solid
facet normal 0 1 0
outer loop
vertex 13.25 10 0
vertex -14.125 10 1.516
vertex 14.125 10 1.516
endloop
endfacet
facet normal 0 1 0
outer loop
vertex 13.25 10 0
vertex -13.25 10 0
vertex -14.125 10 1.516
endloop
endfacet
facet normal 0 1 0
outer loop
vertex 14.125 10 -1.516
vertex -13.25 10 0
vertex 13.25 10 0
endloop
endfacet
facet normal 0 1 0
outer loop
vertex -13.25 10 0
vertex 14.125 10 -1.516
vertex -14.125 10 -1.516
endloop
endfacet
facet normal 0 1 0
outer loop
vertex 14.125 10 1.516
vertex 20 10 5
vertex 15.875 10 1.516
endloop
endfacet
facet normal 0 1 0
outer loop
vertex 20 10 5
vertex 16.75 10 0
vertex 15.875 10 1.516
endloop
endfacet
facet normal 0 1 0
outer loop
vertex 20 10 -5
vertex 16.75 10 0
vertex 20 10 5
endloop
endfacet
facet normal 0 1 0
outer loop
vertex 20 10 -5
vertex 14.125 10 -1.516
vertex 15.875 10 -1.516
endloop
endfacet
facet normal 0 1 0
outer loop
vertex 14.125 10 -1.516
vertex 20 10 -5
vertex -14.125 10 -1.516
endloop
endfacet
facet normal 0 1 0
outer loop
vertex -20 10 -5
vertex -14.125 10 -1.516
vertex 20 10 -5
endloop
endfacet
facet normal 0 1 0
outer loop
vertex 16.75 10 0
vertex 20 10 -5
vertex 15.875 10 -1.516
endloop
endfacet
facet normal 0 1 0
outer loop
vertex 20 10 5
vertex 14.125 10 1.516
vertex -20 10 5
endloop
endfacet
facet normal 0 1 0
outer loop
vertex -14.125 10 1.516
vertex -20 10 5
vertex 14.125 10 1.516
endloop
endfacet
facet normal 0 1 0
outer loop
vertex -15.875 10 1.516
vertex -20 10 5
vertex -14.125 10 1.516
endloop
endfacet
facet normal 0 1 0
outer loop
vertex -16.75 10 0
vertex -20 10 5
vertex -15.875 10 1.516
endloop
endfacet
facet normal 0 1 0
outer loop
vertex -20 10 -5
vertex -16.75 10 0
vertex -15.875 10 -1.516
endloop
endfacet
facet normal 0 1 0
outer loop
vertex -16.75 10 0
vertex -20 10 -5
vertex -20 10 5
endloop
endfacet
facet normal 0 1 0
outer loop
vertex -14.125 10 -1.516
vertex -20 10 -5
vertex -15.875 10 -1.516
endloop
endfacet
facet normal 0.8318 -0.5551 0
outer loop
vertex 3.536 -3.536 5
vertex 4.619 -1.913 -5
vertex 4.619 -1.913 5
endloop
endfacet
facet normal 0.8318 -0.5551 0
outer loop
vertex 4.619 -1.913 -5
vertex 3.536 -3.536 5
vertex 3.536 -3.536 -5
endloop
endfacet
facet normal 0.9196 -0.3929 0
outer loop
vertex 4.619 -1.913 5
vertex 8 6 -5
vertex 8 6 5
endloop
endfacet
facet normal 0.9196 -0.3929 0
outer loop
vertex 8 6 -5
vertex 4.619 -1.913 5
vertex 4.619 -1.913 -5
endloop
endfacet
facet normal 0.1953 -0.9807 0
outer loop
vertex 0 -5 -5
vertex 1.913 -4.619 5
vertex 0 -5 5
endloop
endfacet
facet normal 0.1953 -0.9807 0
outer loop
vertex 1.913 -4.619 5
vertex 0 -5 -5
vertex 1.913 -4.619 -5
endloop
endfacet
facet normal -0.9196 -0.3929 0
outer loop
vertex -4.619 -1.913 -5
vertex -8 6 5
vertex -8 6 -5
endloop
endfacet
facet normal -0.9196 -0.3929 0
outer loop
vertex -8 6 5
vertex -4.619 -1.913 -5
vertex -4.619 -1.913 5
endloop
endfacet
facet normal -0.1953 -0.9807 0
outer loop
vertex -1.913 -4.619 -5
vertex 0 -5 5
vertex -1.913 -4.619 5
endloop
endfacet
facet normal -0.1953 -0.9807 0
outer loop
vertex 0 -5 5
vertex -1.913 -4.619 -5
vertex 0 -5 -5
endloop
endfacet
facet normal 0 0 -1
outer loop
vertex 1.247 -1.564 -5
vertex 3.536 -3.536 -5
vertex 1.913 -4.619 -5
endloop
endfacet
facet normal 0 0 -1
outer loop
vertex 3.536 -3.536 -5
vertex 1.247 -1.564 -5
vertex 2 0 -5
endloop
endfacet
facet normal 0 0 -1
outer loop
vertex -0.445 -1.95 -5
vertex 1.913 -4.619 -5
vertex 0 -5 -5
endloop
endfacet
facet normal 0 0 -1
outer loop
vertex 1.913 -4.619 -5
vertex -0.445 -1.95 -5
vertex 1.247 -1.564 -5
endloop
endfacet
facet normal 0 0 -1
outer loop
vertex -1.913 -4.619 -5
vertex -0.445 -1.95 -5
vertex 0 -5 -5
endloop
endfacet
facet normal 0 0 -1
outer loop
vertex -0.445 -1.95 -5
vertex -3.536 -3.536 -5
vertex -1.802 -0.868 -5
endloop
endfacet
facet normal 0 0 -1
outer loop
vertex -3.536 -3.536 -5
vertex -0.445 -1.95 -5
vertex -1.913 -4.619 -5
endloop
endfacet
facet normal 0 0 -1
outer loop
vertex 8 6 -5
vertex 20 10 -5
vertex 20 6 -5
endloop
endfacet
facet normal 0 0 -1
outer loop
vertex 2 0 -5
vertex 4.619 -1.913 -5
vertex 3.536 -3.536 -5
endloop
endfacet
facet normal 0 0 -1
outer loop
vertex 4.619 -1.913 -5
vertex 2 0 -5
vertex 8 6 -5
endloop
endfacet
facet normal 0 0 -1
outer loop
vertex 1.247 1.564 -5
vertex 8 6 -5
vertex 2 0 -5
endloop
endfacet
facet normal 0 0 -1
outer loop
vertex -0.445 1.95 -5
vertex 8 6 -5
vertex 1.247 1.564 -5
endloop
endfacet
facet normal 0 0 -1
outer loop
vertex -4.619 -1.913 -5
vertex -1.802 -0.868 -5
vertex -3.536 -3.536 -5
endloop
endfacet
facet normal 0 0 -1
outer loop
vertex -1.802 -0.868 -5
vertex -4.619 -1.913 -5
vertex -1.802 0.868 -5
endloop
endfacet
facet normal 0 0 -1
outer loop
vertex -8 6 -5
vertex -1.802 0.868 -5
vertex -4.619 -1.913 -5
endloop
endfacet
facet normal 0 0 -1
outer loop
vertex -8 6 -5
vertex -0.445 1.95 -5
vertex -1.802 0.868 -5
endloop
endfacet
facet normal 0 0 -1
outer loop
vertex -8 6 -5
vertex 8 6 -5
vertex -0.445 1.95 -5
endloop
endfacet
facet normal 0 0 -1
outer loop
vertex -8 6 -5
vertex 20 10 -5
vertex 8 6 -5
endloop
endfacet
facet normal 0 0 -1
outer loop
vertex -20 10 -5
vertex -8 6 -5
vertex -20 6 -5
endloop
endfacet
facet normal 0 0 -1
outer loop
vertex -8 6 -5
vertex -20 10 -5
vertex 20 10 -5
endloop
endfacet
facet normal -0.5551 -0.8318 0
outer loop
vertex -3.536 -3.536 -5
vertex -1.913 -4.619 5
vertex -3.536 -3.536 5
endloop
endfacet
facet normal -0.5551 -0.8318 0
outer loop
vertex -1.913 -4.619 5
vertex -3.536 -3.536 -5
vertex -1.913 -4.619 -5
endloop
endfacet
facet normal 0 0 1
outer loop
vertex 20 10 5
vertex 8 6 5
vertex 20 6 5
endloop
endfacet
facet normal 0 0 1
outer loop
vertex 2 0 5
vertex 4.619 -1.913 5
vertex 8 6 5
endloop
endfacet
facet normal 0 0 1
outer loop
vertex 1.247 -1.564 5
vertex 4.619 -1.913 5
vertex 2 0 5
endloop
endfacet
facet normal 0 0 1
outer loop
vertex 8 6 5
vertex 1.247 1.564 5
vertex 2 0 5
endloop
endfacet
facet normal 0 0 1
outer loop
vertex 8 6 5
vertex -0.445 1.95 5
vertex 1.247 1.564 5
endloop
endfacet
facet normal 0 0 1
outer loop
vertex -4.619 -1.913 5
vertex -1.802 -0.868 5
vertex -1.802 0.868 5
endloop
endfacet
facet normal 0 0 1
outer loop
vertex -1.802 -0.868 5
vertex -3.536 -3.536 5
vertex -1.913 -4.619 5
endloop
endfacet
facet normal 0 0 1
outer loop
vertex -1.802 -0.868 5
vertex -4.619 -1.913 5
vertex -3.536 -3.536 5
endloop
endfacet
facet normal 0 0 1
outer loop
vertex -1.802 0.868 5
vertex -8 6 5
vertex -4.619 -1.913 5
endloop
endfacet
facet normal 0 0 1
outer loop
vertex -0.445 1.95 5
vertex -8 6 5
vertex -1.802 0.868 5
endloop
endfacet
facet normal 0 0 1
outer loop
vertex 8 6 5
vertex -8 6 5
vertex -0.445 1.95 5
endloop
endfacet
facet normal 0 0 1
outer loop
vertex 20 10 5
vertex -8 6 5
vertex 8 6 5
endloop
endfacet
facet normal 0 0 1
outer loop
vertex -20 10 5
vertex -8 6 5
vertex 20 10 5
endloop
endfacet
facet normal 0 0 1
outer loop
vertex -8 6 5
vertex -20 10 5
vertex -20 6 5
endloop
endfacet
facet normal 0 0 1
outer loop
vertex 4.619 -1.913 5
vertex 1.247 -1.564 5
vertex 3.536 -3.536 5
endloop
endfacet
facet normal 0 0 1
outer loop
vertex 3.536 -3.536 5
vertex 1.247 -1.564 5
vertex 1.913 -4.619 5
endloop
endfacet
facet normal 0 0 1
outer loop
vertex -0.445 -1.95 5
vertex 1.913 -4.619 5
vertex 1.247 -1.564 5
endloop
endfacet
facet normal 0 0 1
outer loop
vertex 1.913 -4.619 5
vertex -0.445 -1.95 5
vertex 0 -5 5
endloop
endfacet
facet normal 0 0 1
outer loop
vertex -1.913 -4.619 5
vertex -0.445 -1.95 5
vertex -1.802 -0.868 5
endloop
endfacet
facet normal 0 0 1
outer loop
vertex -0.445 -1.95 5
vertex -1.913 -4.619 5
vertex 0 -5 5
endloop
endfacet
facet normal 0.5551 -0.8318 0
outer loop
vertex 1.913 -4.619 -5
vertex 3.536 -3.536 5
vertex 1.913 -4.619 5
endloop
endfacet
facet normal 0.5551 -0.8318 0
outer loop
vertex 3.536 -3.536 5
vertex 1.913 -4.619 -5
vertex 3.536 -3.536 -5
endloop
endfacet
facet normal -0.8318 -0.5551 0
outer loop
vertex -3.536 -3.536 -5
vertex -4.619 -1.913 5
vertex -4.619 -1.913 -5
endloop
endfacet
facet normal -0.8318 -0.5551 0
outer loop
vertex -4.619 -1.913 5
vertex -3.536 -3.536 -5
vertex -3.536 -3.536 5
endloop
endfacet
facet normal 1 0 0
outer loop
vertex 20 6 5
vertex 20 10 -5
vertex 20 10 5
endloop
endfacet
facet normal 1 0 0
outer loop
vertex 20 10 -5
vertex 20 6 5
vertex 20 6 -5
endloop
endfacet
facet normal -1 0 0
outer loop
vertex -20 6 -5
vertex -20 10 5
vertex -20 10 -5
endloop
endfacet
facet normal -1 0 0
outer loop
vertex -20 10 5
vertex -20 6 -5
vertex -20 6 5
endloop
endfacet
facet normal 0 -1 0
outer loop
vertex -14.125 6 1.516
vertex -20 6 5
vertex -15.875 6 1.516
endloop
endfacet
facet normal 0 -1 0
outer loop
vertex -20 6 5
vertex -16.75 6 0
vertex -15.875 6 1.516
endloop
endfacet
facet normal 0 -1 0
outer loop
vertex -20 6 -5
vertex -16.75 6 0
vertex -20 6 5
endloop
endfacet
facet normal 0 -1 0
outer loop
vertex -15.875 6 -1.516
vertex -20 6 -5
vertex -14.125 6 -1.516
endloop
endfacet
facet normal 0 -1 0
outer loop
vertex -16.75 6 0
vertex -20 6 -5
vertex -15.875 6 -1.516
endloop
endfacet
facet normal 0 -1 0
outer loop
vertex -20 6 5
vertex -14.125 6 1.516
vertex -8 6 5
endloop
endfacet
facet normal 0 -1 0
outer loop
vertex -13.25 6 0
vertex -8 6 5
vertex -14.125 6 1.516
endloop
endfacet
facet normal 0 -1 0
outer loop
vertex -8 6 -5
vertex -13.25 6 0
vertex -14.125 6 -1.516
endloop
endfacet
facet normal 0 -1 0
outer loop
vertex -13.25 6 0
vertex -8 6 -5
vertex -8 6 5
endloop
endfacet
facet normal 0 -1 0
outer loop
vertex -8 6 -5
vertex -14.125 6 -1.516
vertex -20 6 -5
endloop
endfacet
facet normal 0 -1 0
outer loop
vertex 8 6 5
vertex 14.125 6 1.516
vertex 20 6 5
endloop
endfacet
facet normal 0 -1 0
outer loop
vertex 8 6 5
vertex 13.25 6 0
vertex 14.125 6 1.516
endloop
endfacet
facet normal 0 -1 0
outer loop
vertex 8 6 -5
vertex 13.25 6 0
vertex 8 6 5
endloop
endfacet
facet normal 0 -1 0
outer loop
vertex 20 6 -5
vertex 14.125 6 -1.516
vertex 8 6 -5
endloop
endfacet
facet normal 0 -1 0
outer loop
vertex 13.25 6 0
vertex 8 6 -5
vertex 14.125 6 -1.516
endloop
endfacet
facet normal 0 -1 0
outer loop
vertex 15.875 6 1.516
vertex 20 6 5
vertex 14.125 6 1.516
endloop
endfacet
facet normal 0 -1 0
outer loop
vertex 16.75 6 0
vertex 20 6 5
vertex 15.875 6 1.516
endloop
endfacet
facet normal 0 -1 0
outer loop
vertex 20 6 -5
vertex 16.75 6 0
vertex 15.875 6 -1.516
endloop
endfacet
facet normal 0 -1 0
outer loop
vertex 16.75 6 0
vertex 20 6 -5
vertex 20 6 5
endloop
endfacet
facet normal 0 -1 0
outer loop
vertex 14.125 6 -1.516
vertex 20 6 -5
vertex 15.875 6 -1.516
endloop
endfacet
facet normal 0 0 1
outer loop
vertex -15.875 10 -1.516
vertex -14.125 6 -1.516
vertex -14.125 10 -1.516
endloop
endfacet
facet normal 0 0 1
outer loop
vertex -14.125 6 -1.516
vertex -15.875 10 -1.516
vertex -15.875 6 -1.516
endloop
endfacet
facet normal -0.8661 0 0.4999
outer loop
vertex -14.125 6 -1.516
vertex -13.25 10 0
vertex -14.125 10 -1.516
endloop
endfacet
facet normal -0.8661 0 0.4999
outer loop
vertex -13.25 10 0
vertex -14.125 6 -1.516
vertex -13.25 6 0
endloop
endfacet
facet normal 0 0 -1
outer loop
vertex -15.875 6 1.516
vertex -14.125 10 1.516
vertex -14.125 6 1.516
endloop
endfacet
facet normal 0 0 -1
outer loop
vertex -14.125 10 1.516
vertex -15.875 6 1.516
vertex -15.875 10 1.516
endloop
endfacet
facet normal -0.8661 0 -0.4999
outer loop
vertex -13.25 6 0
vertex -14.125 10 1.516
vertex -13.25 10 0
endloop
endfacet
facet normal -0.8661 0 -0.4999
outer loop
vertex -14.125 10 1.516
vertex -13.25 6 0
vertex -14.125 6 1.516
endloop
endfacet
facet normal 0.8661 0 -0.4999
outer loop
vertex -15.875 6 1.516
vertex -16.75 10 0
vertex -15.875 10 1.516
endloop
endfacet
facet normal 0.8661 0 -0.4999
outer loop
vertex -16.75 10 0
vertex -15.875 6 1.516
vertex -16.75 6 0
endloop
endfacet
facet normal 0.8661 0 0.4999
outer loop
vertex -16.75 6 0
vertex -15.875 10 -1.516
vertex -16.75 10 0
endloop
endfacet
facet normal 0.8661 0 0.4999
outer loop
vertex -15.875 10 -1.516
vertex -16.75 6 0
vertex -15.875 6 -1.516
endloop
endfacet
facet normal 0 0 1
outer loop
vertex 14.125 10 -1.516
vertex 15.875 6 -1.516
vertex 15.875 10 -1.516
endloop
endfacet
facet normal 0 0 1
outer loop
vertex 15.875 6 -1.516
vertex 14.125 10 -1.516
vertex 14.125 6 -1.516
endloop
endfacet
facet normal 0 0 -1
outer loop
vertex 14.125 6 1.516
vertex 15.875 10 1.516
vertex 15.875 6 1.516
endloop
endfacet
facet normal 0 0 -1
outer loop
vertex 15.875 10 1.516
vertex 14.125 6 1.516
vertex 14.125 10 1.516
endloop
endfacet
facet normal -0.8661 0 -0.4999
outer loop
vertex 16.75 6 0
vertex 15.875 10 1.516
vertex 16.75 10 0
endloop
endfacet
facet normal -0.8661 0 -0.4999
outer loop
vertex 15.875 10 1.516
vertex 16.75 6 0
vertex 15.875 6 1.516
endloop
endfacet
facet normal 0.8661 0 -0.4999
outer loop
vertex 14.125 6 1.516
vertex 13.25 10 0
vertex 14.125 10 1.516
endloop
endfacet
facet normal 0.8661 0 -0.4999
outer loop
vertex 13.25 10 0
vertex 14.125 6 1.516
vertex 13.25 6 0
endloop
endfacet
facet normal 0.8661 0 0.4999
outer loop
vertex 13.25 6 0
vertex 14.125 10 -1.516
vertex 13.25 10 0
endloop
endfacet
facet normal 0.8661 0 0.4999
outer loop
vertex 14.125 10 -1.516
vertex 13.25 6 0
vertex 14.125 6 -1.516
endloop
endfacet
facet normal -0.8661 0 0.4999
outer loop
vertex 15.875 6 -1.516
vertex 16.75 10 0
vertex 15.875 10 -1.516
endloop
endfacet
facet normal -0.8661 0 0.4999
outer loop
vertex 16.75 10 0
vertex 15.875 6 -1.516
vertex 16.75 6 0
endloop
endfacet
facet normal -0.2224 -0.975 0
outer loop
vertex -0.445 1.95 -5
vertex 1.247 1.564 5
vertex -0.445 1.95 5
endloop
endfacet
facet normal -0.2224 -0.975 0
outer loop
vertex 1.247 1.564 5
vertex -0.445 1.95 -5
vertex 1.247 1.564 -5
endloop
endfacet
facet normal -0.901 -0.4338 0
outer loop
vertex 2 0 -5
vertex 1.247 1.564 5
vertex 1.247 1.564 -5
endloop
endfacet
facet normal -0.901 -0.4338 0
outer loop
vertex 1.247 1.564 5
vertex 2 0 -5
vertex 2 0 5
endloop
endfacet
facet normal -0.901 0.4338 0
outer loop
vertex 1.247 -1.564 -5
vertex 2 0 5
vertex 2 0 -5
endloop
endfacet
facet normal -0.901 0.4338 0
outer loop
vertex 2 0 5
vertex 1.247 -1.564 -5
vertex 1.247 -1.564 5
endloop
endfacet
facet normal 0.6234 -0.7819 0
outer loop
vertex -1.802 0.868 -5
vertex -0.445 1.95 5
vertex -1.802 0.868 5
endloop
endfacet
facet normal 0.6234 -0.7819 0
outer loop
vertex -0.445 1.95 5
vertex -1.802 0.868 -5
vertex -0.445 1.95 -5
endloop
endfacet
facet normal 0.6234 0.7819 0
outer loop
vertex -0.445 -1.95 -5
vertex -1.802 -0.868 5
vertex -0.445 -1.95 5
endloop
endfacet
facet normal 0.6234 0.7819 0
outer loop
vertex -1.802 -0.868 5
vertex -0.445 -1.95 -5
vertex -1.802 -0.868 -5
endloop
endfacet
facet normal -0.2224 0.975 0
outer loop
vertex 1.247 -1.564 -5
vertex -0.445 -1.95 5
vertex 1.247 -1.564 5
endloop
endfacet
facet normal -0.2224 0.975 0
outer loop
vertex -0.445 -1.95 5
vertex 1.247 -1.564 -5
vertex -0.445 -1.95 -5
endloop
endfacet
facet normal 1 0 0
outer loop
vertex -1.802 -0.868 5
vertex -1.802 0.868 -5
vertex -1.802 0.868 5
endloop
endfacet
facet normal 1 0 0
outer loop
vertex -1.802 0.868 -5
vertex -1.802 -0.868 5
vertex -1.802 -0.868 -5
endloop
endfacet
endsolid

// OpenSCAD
// file: config.scad
e = 0.01;

// Real Sterilite Tote Size
//toteHeight = 125;
//toteTopWidth = 200;
//toteBottomWidth = 155;
//toteTopLength = 355;
//toteBottomLength = 300;

// Scaled Size
toteHeight = 30;
toteTopWidth = 60;
toteBottomWidth = 45;
toteTopLength = 105;
toteBottomLength = 90;

// Parameters
fingerHeight = 5;
fingerClearance = 5;

armatureHeight = 10;
armatureThickness = 20;

baseHeight = 20;
baseThickness = 10;

boltDiameter = 3;
pinDiameter = 4;

base2Height = 20;

totesPerRow = 3;
// main file
include <config.scad>;

module armMount() {
  difference() {
    union() {
      hull() {
        cylinder(d = 10, h = baseThickness, center = true);
        translate([0, -4/2 + 10, 0])
          cube([16, 4, baseThickness], center = true);
      }
      translate([0, -4/2 + 10, 0])
        cube([40, 4, baseThickness], center = true);
    }

    cylinder(d = 4, h = baseThickness + e, center = true);
    for (x = [-1, 1])
      translate([x*15, 8, 0])
        rotate([90, 0, 0])
          cylinder(d = 3.5, h = 4 + e, center = true);
  }
}

armMount();
